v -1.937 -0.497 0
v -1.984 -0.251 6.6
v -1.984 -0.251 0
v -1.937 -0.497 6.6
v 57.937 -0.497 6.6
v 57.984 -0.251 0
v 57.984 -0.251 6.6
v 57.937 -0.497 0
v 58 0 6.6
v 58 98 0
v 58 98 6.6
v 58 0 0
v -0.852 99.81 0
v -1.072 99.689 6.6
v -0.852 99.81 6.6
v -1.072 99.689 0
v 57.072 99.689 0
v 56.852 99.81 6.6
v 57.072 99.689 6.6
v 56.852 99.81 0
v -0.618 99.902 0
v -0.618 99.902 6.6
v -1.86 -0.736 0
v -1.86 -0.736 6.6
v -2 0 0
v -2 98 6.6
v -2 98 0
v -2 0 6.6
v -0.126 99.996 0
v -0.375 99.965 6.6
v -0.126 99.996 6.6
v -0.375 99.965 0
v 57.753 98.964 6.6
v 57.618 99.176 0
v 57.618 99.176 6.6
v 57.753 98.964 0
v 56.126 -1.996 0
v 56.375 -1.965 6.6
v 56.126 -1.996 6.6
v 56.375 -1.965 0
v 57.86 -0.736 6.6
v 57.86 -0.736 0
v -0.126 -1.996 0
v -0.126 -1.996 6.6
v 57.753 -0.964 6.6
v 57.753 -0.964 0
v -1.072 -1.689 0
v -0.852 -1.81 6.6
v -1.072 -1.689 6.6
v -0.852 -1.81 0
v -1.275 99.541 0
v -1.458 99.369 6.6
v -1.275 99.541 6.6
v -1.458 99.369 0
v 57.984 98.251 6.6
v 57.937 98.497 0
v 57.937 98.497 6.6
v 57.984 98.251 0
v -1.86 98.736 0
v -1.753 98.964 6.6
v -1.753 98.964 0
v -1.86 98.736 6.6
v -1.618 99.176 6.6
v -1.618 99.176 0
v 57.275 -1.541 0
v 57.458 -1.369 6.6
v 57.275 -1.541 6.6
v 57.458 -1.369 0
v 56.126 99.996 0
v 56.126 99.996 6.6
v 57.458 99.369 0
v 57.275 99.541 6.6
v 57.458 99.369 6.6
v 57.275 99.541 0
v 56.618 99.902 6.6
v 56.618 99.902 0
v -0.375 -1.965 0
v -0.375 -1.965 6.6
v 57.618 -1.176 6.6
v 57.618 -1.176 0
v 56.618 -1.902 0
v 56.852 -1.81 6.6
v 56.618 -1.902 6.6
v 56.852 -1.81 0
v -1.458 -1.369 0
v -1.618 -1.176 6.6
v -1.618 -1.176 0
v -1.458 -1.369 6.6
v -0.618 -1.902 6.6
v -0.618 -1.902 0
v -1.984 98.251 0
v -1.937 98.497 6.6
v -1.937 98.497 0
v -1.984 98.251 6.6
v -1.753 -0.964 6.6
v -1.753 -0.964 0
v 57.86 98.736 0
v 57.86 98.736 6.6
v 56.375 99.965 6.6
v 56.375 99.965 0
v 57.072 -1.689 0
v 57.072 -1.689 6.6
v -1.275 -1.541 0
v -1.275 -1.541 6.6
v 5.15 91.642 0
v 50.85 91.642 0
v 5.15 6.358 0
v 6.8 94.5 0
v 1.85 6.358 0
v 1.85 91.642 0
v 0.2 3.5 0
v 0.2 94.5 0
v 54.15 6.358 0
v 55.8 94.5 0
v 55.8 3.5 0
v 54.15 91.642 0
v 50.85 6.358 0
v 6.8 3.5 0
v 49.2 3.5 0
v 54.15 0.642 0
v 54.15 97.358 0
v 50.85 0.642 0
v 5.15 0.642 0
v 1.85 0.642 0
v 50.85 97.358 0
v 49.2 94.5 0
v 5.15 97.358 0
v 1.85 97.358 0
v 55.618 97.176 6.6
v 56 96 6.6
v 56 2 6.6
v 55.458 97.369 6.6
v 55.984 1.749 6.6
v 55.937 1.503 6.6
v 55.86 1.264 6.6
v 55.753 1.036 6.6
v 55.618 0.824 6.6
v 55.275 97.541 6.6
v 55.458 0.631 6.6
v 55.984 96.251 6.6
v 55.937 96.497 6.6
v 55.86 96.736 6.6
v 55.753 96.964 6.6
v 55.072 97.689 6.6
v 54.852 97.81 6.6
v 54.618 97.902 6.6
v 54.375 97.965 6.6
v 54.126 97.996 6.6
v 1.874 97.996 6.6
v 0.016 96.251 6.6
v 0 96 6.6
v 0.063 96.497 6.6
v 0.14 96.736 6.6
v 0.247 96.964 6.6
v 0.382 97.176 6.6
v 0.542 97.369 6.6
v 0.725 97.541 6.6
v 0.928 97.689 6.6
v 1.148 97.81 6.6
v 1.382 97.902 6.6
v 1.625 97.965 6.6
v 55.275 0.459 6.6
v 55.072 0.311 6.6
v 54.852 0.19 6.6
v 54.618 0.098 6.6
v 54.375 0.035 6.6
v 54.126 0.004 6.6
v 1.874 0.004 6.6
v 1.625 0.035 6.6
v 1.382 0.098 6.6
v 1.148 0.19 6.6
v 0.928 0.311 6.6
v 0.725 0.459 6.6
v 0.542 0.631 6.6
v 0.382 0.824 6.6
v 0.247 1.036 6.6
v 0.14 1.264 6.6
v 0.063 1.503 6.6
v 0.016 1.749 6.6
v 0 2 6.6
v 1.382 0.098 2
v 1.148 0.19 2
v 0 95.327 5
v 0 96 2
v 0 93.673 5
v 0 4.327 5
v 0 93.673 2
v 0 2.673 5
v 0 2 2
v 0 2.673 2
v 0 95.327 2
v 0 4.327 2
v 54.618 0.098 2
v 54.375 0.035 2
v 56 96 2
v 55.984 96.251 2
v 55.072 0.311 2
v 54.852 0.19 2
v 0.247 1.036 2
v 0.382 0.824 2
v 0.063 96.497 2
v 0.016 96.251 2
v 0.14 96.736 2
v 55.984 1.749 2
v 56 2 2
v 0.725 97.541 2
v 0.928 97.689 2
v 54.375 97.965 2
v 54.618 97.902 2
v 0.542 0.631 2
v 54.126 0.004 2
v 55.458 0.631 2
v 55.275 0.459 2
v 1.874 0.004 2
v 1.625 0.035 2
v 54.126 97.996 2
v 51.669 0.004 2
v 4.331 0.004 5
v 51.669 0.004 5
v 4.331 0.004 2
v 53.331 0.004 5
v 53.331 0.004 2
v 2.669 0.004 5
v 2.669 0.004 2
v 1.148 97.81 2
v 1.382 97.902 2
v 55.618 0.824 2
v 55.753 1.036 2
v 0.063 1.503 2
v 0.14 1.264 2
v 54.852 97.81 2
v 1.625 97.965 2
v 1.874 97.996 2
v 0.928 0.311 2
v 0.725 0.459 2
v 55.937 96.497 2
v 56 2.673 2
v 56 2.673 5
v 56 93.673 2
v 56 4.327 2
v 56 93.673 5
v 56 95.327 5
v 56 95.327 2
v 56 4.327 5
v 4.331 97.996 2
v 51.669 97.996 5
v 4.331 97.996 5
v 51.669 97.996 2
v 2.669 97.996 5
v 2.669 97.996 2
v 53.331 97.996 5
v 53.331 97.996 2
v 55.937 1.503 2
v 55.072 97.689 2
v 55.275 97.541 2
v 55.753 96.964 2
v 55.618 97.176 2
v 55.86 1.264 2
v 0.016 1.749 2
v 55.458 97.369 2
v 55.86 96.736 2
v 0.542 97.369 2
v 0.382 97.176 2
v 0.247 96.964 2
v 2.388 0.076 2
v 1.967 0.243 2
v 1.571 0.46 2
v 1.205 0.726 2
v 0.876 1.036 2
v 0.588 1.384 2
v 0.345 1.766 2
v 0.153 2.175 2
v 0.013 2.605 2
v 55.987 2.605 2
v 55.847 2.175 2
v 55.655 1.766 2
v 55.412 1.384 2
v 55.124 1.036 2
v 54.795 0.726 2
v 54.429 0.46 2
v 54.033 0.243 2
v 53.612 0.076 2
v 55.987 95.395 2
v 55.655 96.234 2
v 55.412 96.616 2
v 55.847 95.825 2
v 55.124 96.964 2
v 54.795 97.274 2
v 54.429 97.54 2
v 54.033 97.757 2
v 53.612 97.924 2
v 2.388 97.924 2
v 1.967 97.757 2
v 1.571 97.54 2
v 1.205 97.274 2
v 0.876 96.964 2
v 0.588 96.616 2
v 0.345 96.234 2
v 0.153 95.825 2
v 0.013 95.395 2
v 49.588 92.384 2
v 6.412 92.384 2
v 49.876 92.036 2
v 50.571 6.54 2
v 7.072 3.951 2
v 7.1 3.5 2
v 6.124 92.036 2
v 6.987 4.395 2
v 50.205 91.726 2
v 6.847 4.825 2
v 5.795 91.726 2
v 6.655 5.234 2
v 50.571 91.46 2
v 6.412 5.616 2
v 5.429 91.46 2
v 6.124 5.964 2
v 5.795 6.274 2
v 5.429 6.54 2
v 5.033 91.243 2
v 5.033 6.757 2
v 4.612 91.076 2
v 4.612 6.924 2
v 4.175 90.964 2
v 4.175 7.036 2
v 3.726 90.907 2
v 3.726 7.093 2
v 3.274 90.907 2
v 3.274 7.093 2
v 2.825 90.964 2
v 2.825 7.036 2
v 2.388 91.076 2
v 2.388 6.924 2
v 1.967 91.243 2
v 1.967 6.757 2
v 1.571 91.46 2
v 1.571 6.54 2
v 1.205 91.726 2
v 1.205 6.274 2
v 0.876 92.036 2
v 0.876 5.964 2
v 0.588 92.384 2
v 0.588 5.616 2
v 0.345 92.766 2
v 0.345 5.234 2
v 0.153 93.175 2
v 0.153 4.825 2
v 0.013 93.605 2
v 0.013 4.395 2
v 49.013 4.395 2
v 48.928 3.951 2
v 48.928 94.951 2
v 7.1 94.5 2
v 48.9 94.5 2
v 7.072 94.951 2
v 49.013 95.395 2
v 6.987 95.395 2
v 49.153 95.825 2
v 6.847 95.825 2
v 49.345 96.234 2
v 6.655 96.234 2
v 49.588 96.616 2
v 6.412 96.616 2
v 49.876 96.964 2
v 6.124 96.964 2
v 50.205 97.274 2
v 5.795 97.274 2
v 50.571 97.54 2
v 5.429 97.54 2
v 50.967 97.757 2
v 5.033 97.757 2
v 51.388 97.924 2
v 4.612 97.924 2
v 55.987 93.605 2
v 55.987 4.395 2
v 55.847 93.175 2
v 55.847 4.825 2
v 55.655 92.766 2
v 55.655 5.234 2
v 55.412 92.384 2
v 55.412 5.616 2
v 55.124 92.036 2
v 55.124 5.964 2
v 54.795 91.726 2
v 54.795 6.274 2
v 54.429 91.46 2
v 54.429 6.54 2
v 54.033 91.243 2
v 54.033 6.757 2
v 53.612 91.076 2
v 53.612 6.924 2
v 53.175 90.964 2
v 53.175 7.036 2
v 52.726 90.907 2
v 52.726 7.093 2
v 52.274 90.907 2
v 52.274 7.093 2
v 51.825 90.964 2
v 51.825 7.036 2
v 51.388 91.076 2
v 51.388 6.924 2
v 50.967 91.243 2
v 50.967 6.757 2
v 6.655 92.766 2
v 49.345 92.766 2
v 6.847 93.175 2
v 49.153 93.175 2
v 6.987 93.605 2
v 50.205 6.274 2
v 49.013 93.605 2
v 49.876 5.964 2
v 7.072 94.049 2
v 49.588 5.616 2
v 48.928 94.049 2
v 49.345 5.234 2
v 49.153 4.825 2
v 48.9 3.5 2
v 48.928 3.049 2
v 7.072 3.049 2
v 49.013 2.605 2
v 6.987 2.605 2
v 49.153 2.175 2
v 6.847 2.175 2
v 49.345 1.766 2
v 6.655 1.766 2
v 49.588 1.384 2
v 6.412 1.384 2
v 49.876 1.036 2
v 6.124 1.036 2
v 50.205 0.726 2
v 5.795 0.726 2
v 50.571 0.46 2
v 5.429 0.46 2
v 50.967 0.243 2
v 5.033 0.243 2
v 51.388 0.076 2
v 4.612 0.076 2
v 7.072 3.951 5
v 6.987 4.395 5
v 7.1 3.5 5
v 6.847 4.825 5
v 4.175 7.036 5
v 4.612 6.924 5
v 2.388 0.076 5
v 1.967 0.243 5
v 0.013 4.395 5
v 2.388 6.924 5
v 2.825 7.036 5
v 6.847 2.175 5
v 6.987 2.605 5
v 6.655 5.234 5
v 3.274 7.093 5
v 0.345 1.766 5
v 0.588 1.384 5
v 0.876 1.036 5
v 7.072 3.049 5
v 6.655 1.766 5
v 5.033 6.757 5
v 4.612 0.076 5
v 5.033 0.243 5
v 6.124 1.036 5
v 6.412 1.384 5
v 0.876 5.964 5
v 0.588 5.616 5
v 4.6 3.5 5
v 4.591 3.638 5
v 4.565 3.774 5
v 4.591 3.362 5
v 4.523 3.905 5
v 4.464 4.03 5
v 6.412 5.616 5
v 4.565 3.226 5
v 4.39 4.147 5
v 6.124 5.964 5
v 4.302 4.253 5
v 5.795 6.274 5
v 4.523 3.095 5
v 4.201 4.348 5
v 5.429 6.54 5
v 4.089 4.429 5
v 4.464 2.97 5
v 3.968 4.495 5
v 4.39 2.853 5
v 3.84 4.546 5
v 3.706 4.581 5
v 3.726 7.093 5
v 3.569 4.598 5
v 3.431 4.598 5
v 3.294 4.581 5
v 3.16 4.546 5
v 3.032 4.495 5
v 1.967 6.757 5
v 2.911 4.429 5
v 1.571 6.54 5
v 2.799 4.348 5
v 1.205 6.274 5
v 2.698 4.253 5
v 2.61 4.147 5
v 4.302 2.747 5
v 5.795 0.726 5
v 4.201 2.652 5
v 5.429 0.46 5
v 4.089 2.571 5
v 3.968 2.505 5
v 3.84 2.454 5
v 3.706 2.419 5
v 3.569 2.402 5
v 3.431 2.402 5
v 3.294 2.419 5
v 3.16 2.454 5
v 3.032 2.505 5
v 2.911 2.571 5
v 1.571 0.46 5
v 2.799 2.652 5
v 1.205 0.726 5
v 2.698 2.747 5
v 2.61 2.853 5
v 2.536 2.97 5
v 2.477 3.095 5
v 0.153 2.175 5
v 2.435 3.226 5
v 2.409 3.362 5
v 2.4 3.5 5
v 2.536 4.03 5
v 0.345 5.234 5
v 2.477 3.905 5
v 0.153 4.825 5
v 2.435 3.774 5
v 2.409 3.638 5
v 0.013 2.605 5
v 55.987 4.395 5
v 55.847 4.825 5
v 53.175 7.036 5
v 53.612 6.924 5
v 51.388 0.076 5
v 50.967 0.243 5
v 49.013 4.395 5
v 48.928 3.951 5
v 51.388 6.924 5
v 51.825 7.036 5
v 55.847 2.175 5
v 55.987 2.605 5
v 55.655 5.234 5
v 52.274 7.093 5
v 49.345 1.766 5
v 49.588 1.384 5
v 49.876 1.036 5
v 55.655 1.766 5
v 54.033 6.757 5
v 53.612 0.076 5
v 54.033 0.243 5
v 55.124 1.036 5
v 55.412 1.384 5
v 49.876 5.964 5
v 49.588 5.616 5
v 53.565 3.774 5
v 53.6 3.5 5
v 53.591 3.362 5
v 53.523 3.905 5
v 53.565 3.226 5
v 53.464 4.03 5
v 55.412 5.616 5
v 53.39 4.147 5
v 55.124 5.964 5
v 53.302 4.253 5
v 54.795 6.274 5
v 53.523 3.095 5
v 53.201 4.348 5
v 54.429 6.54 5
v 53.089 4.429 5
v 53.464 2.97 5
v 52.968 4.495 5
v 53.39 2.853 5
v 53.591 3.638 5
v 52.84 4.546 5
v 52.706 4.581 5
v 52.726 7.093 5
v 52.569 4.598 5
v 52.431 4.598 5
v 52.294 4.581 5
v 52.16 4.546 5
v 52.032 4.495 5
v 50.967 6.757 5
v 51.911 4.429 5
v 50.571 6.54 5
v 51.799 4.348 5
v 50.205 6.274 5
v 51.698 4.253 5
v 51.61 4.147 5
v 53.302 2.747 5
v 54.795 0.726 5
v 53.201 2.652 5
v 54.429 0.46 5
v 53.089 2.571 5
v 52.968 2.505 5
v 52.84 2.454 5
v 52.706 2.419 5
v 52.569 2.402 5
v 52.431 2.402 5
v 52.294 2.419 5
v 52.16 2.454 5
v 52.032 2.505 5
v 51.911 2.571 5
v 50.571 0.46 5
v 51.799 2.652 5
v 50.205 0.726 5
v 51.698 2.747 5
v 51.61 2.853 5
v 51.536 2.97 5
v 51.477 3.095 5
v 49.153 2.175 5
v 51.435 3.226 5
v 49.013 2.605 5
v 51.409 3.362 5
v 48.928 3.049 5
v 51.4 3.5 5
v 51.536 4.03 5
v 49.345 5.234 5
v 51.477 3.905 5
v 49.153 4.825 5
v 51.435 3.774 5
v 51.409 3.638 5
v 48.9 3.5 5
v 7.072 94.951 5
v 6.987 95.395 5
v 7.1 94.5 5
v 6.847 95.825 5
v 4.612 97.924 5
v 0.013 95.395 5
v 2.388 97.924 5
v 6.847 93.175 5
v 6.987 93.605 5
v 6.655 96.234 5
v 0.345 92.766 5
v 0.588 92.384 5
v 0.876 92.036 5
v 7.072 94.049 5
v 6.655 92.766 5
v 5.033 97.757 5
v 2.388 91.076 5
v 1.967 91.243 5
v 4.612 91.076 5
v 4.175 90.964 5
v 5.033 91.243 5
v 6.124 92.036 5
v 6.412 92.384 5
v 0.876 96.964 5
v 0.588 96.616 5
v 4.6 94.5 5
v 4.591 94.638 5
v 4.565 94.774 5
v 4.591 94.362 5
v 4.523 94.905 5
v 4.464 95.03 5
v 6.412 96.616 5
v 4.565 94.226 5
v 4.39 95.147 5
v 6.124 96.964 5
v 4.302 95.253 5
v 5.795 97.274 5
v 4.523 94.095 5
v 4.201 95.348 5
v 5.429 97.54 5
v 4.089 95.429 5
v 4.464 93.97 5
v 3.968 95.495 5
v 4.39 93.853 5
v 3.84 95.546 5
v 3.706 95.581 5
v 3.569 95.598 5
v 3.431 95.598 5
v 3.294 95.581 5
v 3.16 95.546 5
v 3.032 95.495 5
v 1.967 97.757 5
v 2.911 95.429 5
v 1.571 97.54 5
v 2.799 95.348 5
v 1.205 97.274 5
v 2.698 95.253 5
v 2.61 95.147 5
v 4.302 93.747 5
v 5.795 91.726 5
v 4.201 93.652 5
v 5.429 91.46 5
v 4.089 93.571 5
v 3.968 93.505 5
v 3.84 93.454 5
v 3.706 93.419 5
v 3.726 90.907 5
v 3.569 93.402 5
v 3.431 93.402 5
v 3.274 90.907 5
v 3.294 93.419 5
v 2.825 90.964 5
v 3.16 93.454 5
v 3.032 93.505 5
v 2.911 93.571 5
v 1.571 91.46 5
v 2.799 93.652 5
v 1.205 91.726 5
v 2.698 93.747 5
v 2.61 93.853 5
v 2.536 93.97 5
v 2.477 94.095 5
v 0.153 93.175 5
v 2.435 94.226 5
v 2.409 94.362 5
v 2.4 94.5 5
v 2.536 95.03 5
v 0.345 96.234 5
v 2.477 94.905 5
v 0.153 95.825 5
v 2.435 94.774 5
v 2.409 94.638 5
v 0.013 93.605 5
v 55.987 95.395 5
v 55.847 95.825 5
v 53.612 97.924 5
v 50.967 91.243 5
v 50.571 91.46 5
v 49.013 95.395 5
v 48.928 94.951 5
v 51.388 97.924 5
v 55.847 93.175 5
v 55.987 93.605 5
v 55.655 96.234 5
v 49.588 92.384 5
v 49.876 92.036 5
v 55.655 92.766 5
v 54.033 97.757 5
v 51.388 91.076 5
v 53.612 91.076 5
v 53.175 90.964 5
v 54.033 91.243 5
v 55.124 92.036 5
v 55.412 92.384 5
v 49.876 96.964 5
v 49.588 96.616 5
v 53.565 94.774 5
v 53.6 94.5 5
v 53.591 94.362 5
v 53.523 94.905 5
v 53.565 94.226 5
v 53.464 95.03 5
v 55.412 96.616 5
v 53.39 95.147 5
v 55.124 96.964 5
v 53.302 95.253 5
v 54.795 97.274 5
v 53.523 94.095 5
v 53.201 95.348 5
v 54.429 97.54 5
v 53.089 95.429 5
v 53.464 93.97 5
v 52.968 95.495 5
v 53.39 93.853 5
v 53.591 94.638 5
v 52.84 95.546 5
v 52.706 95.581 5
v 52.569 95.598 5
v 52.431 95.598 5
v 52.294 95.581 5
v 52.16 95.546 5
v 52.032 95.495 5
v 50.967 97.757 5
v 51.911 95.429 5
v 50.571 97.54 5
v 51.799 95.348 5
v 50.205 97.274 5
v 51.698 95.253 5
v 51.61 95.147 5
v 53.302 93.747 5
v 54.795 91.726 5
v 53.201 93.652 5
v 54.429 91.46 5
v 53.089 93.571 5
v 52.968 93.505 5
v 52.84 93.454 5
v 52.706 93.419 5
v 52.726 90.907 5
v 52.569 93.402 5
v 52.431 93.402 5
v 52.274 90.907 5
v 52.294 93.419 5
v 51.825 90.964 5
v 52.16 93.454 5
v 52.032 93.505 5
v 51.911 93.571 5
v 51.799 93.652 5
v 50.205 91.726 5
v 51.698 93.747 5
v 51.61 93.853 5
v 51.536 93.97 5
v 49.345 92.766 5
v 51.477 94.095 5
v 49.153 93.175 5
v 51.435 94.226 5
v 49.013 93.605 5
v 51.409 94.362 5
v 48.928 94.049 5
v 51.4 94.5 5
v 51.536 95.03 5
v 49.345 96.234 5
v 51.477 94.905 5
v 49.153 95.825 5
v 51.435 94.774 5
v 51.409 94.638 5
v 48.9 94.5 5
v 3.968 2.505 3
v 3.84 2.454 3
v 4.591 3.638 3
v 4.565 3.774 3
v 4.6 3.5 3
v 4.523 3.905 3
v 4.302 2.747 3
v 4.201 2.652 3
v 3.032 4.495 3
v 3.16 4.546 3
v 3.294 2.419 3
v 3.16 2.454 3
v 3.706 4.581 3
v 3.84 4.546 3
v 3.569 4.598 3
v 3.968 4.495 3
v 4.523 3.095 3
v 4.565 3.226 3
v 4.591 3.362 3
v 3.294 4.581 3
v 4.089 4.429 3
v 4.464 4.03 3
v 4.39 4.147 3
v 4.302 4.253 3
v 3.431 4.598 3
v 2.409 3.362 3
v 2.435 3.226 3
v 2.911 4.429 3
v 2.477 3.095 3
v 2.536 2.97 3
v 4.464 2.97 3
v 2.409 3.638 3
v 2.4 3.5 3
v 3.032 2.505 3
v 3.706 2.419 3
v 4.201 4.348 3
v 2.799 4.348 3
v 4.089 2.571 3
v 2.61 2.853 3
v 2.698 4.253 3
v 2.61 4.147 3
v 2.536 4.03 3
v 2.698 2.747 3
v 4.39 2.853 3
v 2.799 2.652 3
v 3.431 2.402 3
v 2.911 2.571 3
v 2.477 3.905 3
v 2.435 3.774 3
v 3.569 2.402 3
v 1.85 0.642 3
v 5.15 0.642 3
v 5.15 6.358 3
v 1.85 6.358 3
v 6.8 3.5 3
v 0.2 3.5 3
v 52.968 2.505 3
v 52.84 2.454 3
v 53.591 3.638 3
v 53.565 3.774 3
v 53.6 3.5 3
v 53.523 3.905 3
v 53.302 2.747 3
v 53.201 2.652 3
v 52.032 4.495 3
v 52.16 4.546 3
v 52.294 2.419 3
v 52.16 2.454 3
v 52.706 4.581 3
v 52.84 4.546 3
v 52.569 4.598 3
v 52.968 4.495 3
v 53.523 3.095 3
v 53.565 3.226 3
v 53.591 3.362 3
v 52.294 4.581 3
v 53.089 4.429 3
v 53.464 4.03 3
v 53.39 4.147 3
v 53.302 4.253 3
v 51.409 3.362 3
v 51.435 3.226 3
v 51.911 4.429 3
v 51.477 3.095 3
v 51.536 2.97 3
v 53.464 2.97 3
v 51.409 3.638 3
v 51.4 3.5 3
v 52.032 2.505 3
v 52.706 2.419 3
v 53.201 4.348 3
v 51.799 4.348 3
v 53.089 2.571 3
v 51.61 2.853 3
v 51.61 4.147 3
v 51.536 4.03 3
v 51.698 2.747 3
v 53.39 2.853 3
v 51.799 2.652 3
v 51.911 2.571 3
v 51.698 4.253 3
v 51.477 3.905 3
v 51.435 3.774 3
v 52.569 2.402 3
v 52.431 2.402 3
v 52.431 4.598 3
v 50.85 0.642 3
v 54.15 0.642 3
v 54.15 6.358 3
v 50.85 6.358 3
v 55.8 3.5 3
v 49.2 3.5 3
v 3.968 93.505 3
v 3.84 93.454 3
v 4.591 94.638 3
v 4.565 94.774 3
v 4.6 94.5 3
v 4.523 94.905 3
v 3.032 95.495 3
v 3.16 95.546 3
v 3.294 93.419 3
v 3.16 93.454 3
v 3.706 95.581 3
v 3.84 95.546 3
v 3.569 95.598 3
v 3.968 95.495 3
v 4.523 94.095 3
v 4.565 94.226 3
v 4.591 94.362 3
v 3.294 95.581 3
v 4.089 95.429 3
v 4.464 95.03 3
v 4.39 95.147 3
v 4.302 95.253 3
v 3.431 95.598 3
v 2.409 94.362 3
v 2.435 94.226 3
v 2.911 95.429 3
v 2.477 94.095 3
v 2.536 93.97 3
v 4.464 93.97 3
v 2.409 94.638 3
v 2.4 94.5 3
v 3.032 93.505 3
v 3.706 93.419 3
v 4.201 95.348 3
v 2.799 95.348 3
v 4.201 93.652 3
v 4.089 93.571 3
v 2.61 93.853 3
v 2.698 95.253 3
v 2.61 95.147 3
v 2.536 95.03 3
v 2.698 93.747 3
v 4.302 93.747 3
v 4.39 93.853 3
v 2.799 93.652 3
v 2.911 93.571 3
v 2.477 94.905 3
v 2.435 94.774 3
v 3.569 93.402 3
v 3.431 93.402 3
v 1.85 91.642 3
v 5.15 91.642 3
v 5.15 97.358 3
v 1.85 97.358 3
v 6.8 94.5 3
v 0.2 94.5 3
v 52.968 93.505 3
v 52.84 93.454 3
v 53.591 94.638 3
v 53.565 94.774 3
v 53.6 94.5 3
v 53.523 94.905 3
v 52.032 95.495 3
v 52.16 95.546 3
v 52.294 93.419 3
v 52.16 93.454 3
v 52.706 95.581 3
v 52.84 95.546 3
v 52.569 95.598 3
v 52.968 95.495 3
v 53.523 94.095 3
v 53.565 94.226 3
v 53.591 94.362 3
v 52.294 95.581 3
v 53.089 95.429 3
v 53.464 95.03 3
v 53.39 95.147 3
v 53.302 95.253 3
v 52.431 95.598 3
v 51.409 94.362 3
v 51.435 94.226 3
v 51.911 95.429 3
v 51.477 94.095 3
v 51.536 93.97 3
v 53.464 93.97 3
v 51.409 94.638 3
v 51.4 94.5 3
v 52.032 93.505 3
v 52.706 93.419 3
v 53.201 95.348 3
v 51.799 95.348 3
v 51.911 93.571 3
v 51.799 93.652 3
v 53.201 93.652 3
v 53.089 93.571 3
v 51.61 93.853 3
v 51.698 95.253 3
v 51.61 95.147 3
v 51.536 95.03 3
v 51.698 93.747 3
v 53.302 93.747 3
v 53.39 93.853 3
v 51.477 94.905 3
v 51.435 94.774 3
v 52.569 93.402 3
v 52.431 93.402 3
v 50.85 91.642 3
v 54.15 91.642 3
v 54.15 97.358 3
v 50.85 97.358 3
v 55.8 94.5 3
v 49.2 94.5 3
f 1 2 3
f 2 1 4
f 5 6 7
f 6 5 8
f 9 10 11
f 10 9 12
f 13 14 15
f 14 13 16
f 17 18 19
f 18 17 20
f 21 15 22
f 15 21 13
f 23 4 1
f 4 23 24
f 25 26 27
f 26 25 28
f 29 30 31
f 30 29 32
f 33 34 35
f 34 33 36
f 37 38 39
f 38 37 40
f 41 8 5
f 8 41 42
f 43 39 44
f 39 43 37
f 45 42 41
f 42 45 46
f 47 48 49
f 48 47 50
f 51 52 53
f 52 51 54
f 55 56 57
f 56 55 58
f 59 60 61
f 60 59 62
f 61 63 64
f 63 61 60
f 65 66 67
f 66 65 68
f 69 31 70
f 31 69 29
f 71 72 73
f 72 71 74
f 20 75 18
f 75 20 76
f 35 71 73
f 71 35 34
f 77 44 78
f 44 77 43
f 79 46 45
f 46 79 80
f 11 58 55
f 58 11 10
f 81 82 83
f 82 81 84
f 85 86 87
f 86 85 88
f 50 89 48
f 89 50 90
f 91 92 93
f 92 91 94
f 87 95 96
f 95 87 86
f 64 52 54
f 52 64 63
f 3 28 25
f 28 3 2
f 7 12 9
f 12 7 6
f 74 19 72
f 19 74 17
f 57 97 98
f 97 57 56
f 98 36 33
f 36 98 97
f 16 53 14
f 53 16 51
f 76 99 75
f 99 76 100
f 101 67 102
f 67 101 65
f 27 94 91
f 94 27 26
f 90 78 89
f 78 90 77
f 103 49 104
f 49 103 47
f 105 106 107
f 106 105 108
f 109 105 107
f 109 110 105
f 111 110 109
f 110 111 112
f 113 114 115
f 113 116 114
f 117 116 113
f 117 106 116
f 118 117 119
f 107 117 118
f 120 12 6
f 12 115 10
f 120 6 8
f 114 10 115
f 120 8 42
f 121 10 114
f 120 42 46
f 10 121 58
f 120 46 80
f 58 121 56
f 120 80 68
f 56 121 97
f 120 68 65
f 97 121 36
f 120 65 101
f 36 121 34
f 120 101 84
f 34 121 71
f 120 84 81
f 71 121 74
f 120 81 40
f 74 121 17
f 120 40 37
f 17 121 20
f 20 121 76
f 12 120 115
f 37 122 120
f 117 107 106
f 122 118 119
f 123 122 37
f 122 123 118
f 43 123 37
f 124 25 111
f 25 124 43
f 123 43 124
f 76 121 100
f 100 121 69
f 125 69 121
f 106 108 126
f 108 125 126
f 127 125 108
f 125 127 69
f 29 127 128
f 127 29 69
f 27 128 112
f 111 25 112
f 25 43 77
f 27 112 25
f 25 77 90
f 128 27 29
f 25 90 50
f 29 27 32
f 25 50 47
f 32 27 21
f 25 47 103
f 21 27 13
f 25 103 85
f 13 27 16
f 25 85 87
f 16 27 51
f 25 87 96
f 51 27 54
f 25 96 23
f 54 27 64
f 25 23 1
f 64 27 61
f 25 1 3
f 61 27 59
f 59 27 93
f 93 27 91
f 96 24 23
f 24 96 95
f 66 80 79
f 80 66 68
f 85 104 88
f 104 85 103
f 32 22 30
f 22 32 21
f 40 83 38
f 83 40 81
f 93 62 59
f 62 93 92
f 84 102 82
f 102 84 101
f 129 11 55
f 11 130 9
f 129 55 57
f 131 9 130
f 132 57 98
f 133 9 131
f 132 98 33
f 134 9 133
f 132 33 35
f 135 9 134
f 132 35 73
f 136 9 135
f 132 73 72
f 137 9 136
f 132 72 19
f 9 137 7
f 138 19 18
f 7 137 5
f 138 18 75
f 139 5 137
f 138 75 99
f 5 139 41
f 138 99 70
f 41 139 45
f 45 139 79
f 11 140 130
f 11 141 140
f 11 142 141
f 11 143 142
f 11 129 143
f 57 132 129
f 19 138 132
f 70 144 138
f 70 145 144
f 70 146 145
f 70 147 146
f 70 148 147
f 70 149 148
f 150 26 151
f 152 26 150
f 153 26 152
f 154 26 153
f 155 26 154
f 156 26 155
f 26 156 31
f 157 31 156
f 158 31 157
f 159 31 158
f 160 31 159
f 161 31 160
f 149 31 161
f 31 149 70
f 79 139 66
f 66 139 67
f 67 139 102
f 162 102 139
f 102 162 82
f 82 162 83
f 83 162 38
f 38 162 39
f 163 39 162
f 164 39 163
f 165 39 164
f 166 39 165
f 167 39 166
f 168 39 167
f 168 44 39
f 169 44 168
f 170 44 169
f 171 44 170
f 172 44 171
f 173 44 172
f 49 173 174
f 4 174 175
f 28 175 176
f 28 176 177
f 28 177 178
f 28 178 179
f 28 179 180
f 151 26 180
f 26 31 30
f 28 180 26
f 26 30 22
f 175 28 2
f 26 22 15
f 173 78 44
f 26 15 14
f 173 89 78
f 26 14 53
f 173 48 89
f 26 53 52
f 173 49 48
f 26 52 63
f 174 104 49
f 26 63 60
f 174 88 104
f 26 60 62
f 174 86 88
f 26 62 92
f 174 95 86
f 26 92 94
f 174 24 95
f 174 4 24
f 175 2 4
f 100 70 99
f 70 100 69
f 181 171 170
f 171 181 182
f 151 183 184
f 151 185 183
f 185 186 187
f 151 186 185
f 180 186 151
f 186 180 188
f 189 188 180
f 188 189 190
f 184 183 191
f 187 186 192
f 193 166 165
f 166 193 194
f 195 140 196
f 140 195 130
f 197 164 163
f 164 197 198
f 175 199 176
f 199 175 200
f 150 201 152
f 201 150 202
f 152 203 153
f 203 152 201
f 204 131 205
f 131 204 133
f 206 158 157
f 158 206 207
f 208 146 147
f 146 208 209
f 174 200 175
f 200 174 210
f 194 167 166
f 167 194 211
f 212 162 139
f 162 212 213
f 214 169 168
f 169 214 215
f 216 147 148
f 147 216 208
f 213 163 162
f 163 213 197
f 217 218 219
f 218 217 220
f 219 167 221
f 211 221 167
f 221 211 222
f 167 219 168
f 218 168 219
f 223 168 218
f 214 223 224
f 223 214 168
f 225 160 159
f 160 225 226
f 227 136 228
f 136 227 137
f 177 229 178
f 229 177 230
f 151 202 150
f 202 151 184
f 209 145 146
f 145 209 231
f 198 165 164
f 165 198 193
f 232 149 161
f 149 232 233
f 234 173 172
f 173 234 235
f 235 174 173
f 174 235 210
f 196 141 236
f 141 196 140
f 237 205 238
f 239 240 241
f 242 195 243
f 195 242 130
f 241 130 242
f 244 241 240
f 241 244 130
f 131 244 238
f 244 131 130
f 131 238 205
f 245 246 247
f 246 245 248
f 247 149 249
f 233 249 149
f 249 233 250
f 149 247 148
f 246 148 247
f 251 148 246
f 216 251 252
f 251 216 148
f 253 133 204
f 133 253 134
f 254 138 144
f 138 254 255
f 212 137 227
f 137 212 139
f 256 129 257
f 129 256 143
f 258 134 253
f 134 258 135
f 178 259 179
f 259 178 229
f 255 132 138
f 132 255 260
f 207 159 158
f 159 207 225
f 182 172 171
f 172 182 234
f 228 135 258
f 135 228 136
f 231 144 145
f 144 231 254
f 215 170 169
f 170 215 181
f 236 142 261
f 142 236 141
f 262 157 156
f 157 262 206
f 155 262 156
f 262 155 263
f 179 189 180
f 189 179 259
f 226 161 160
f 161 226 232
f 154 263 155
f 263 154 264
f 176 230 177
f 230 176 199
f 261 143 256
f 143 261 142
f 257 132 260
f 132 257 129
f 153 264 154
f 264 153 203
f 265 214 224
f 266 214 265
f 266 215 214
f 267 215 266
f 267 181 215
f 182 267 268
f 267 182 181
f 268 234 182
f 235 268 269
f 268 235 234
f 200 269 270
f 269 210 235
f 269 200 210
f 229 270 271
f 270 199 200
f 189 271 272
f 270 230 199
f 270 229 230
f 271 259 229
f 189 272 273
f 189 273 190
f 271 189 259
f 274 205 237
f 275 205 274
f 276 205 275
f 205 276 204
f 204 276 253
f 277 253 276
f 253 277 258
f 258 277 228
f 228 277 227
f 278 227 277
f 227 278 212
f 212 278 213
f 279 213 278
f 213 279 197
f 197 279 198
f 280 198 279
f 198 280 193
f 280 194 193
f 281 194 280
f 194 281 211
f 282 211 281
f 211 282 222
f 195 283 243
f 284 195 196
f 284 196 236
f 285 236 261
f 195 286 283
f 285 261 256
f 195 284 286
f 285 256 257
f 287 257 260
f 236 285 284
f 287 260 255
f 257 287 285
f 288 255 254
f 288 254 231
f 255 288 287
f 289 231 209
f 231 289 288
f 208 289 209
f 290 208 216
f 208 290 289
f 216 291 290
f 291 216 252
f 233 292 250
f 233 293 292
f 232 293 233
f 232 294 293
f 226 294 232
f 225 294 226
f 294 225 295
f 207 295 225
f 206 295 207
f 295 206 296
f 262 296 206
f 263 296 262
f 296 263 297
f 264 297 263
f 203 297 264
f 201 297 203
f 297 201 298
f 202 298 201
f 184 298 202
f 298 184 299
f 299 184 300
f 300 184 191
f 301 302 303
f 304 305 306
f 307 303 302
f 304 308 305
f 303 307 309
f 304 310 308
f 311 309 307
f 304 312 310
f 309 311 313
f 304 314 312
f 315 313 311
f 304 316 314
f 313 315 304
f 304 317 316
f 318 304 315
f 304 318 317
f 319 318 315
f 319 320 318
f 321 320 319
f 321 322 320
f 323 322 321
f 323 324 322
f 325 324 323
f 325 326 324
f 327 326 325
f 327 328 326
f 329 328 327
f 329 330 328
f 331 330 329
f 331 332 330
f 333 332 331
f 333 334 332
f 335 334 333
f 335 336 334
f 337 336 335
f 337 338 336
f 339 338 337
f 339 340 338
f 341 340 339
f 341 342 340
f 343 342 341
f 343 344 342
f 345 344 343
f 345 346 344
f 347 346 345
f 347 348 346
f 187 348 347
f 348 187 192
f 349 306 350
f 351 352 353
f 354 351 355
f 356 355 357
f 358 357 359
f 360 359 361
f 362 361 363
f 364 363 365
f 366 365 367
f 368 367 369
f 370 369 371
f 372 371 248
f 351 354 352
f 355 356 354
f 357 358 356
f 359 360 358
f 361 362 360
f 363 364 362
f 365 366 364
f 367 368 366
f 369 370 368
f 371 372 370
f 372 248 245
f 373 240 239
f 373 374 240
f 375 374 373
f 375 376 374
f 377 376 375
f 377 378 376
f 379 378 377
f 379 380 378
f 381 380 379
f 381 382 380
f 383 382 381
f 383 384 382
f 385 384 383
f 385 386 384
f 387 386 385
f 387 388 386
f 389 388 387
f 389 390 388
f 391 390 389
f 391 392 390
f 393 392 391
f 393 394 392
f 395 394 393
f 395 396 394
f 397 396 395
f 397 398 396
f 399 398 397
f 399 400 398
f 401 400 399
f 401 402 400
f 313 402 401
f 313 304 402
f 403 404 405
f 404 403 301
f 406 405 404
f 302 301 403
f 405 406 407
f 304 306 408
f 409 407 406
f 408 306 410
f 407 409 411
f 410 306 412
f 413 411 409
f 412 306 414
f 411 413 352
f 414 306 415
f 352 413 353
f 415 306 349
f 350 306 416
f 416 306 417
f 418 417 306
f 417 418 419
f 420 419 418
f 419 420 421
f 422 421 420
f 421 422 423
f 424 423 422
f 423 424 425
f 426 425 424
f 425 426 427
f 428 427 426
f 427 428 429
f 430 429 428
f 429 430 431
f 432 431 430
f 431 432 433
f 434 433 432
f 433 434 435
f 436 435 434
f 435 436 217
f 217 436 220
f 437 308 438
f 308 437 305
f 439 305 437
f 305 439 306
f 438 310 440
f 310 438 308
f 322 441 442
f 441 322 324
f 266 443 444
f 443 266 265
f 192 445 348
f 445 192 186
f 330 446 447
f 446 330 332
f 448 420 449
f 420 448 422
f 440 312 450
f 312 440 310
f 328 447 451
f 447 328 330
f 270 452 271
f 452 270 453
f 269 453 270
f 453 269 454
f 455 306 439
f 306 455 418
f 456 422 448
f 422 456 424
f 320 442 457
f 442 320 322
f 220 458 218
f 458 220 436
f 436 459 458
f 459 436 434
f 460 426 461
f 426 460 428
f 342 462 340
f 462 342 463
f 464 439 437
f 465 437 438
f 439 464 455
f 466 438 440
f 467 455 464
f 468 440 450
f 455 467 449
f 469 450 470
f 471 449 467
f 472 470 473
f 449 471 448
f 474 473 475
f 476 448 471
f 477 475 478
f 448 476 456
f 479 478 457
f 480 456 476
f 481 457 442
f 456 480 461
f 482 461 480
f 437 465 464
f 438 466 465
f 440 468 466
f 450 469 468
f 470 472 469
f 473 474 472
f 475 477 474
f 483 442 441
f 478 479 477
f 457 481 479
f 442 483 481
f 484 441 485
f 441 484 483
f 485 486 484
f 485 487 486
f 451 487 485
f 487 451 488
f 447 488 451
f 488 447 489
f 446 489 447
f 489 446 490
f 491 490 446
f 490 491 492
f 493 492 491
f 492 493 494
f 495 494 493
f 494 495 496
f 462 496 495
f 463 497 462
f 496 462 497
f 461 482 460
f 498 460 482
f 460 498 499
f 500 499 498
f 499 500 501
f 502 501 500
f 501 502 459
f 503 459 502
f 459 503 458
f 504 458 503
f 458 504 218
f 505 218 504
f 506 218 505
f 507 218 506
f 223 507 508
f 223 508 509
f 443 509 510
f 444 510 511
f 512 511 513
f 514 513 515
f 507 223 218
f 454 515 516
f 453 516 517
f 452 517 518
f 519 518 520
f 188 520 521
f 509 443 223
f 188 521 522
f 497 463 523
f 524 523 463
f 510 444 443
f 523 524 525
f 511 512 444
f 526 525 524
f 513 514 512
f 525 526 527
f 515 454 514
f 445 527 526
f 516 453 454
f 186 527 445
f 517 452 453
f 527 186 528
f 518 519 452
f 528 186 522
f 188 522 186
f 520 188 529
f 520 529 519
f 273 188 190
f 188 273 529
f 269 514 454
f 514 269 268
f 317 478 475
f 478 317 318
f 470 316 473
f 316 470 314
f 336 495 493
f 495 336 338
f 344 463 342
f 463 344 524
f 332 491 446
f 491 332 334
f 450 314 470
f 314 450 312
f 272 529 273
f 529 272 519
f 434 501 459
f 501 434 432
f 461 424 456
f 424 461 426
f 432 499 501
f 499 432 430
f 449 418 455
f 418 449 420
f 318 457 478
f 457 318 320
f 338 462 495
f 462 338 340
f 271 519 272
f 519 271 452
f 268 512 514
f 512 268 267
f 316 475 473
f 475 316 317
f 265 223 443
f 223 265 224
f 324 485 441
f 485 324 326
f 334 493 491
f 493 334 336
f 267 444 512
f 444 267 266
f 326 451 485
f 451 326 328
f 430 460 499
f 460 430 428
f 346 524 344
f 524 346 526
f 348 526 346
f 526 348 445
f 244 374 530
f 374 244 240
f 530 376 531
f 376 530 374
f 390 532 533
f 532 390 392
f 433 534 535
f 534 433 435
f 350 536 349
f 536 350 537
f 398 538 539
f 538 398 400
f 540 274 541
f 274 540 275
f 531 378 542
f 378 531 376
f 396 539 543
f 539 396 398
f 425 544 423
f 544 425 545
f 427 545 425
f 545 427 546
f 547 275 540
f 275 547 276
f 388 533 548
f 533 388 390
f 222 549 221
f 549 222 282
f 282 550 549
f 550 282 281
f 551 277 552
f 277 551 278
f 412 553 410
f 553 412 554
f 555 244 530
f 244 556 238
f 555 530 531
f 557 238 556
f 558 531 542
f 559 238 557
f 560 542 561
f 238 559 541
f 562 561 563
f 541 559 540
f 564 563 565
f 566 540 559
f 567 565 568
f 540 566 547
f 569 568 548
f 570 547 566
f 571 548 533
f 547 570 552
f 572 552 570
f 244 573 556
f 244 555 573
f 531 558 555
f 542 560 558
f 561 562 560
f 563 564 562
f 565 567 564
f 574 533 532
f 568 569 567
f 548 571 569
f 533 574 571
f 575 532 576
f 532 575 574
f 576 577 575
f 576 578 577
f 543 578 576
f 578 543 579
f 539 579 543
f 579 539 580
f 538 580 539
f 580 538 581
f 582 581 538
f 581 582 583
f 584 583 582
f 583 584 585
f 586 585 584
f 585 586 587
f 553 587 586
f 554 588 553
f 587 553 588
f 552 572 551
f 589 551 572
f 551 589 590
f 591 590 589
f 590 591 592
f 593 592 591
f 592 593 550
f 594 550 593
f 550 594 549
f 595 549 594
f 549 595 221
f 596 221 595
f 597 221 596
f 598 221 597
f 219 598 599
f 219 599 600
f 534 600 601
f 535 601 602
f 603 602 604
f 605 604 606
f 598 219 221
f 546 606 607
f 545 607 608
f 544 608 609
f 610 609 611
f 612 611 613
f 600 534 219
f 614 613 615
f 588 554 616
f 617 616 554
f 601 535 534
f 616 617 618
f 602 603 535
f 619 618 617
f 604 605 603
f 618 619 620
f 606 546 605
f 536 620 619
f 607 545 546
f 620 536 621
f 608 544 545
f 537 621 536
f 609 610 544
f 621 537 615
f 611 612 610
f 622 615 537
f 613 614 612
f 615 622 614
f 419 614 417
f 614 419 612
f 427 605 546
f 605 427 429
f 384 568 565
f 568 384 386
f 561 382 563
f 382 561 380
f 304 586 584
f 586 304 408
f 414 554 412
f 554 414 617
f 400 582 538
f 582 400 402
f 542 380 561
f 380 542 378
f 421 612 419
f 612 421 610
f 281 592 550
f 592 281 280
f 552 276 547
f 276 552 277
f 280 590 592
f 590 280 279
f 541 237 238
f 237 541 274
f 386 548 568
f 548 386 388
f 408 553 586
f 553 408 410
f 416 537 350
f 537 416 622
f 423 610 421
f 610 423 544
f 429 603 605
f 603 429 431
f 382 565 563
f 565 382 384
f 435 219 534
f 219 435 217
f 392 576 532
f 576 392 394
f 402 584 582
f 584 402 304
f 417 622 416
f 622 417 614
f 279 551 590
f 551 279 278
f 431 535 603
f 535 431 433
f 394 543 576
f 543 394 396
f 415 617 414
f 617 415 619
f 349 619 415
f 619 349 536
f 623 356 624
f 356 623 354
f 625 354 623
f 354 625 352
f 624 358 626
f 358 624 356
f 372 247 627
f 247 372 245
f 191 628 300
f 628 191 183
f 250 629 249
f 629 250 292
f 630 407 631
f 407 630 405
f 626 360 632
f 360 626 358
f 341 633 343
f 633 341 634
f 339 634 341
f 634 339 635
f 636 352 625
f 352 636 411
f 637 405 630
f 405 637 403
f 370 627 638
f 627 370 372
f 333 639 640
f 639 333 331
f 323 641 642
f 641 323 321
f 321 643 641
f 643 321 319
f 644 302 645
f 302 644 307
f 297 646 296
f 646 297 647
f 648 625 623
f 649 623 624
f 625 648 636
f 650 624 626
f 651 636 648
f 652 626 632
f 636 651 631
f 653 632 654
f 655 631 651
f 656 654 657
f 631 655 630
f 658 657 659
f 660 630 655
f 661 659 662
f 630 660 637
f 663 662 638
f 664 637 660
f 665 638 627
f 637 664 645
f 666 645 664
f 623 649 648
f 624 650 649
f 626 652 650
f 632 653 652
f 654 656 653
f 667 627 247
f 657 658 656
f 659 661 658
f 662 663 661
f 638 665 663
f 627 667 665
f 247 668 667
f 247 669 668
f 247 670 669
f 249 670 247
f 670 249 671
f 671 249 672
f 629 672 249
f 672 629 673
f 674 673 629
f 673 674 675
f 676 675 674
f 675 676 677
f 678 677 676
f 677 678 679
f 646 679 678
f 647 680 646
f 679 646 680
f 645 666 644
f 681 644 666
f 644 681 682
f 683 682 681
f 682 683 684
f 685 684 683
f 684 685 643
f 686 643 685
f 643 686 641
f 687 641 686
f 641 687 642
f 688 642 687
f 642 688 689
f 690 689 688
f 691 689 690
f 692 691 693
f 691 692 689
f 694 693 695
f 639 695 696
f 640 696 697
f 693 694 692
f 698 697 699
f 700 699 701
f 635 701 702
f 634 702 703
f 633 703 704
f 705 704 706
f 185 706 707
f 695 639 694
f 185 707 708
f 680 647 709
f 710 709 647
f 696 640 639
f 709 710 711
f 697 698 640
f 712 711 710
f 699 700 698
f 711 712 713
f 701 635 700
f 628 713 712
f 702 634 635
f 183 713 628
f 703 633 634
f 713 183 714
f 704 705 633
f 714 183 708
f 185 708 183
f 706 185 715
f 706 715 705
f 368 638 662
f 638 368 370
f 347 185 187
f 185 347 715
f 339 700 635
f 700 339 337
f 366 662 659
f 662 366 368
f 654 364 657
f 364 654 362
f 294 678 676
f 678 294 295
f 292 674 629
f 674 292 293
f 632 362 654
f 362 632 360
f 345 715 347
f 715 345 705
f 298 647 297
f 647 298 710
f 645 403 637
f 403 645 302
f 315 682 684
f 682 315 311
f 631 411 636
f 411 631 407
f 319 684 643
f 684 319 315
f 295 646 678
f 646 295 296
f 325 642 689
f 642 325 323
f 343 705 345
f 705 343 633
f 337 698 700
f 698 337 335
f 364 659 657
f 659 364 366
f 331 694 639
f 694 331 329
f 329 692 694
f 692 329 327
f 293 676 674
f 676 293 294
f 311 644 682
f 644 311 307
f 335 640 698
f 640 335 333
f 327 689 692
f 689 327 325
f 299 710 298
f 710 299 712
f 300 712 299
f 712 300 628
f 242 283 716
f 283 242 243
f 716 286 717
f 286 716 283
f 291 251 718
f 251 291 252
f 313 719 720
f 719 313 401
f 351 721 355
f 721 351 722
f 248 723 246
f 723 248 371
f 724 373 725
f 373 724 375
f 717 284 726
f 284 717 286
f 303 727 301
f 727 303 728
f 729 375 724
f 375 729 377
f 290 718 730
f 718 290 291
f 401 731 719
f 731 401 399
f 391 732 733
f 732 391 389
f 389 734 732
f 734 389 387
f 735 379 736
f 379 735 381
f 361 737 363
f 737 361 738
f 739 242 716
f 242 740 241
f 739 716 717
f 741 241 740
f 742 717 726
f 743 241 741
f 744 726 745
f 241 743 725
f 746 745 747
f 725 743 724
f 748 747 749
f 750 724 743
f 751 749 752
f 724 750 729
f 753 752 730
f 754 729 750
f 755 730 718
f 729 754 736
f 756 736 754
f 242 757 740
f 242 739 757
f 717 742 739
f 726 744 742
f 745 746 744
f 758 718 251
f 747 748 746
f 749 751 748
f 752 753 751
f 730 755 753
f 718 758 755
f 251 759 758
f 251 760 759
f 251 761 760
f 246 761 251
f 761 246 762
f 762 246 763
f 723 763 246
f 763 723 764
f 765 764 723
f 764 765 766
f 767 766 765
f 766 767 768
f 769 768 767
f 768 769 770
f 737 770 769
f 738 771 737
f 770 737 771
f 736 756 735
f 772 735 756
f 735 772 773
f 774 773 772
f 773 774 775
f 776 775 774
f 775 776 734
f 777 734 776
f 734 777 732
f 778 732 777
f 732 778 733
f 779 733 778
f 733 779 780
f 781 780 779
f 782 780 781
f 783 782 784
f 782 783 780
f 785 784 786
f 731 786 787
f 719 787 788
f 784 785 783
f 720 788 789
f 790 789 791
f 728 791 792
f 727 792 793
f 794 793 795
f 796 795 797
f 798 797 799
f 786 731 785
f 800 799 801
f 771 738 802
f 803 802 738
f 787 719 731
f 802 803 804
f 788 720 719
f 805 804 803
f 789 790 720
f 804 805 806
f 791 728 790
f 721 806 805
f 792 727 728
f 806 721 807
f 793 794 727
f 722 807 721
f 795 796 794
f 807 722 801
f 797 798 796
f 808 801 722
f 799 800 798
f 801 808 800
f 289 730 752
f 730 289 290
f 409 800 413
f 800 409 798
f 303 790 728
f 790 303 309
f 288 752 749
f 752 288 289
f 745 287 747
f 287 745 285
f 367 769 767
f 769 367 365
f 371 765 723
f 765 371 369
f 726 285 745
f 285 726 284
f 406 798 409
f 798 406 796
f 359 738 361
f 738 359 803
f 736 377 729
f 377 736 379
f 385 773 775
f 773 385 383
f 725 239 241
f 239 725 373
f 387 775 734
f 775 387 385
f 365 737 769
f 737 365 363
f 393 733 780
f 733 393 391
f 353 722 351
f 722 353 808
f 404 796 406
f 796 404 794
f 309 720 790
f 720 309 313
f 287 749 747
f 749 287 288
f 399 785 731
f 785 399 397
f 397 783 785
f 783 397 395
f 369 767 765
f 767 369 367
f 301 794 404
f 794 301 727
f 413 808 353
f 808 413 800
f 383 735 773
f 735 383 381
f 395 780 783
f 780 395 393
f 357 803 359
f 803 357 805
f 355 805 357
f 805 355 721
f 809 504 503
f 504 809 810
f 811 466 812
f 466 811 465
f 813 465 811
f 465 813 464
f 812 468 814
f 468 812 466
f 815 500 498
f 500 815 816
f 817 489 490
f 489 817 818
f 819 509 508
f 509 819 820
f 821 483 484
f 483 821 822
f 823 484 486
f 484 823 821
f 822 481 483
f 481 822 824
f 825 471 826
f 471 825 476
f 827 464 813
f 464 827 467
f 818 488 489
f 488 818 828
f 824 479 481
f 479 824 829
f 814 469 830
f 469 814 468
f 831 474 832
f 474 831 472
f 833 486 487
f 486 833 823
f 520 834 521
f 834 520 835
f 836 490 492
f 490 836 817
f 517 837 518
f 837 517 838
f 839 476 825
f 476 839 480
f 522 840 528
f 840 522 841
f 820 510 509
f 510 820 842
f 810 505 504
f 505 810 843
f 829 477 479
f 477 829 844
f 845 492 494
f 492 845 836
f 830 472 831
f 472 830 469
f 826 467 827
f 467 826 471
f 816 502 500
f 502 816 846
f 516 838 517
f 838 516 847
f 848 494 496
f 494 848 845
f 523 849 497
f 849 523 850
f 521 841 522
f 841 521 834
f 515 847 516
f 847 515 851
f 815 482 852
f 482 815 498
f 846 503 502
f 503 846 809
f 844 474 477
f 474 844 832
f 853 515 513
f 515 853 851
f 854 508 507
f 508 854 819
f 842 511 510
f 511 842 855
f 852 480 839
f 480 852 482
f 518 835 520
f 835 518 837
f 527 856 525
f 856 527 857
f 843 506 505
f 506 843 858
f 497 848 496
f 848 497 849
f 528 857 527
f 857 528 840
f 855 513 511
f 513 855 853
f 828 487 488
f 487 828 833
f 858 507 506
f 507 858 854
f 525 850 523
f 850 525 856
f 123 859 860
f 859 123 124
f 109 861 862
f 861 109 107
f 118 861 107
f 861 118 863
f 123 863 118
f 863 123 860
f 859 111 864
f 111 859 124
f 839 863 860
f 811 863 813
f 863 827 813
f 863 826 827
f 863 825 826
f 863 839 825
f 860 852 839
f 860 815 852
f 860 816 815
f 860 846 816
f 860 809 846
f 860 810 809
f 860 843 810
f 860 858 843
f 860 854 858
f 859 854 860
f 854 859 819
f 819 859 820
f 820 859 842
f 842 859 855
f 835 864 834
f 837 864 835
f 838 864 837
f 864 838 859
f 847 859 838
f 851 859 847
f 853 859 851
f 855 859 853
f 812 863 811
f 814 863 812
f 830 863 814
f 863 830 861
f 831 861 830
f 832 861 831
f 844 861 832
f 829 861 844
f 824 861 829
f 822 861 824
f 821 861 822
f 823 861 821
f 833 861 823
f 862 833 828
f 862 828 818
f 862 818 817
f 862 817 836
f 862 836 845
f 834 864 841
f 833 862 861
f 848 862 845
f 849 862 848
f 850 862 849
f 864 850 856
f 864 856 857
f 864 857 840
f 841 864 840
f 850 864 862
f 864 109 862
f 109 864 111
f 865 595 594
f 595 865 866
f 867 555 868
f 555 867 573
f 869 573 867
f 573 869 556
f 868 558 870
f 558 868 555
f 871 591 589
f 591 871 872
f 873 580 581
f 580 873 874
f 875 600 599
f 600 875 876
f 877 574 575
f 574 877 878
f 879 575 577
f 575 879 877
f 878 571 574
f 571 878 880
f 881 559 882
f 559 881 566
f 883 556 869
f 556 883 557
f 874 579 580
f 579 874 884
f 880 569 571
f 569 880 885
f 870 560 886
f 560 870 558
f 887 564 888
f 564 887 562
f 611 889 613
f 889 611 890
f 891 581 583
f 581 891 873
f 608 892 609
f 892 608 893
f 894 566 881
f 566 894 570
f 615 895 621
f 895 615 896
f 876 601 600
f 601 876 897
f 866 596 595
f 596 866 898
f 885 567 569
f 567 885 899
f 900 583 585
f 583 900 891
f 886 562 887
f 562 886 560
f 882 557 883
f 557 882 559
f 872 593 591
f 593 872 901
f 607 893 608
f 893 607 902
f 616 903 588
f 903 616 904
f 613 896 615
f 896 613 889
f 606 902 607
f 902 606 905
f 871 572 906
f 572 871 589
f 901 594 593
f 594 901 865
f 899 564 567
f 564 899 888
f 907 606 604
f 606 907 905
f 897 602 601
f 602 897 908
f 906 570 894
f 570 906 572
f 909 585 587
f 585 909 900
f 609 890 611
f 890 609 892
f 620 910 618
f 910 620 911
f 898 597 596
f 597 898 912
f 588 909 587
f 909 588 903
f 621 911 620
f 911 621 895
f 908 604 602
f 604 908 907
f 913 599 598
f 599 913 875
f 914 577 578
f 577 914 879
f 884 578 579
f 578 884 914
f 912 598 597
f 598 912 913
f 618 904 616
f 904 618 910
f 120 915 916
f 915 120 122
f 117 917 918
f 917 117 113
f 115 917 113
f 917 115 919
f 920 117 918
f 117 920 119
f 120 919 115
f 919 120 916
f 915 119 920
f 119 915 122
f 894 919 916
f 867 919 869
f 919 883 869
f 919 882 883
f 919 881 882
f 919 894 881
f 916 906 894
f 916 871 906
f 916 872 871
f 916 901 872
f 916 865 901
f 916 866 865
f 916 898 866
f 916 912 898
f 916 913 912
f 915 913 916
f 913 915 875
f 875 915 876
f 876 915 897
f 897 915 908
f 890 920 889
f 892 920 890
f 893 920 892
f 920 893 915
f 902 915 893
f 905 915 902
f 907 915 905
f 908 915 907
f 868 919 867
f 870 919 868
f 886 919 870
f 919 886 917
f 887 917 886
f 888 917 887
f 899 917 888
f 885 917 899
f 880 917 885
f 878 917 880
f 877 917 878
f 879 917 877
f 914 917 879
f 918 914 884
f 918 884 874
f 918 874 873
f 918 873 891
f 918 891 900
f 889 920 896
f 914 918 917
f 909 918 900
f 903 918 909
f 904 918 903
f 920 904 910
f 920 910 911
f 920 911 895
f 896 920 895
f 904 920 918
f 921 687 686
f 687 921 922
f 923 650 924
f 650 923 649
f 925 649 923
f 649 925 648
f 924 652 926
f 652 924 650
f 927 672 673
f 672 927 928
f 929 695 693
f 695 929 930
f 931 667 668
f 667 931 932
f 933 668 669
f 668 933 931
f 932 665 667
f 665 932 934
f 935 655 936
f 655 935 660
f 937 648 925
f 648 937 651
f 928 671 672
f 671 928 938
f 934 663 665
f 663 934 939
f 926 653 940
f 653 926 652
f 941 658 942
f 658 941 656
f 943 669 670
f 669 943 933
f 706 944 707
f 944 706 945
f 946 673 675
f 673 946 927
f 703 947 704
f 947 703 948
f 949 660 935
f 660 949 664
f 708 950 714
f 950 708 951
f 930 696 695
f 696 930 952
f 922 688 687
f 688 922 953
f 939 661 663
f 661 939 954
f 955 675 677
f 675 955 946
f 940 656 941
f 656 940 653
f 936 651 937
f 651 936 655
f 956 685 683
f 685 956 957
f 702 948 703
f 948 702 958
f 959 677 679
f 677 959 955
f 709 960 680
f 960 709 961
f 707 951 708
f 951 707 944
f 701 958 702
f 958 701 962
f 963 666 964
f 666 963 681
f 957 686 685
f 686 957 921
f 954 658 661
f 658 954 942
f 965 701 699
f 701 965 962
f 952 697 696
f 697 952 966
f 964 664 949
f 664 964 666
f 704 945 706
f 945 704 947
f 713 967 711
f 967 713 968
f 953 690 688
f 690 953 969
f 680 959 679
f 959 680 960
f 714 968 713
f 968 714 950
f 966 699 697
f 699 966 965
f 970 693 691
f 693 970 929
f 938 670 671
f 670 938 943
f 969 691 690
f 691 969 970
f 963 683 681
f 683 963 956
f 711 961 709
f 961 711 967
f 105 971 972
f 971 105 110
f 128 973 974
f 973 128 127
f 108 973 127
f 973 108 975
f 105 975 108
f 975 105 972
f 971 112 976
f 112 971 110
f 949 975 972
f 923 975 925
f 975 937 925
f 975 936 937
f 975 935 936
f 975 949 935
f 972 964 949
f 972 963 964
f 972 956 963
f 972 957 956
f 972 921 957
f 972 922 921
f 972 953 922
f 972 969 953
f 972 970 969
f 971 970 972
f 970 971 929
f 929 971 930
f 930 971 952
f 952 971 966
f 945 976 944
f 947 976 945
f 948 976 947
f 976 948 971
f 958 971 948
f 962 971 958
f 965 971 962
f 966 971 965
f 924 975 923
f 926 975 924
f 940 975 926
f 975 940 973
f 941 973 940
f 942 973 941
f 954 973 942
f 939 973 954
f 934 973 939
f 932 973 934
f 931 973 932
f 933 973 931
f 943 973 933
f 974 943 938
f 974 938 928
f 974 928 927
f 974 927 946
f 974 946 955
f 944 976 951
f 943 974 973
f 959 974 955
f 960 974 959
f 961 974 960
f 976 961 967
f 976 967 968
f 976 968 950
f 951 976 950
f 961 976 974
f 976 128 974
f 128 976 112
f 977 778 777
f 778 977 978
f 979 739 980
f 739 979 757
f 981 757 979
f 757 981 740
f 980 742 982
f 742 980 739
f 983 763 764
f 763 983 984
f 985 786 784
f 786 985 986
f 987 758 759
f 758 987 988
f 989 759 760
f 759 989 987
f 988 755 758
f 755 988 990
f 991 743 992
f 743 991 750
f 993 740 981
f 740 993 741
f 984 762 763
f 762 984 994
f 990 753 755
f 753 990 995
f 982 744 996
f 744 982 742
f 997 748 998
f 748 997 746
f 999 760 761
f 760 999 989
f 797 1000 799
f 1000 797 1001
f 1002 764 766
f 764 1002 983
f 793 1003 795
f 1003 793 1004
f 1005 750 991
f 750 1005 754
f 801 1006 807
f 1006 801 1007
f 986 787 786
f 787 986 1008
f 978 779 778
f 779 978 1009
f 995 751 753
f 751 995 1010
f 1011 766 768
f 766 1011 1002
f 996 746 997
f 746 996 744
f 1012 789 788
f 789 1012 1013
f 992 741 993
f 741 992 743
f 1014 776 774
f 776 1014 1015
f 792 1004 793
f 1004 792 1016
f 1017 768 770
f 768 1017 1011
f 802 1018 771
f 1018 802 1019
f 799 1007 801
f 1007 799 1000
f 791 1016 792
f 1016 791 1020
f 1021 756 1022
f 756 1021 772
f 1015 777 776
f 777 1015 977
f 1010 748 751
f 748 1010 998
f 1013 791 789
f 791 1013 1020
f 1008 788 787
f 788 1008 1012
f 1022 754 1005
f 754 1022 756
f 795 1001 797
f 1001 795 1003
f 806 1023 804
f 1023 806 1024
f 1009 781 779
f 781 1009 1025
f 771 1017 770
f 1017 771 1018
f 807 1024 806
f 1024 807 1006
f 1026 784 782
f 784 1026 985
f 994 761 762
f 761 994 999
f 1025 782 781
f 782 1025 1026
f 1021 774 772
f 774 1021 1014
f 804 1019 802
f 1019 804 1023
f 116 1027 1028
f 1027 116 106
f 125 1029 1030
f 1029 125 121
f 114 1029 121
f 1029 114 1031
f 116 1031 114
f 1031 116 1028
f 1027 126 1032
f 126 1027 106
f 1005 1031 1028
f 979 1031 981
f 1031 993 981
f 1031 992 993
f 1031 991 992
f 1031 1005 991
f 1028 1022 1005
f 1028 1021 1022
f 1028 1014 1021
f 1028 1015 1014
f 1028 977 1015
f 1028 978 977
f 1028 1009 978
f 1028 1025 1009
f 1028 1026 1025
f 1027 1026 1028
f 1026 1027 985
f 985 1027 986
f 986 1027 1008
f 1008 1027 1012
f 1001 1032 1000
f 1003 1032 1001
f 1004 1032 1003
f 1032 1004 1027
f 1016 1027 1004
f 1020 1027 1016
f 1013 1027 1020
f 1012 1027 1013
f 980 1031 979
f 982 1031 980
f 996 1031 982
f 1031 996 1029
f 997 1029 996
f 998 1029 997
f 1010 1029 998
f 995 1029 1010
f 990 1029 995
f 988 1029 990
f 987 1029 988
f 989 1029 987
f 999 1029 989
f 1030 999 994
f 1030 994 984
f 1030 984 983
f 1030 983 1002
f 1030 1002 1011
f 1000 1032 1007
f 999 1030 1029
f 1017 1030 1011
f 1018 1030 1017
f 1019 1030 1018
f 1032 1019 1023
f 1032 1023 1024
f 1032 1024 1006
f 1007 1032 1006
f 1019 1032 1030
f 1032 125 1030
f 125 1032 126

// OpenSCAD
// file: common.scad
pcb_width = 98;
pcb_height = 56;
pcb_thickness = 1.6;
pcb_screw_hole_radius = 2.1;	// M4/2-margin

thickness = 2;
round_radius = 2;

width = pcb_width + thickness * 2;	// y
height = pcb_height + thickness * 2;	// x
bottom_depth = 5;	// z
top_depth = 26;		// z

screw_hole_radius = 1.1;	// M2/2
screw_posx = 3.5;
screw_posy = 3.5;

rj45 = [16, thickness*2, 13.8];
usb = [15, thickness*2, 9];

$fn = 50;

posx = screw_posx;
posy = screw_posy;
holes = [
    [posx, posy, 0],
    [pcb_height-posx, posy, 0],
    [posx, pcb_width-posy, 0],
    [pcb_height-posx, pcb_width-posy, 0]
];
// main file
include <common.scad>;

module case () {
    difference () {
        minkowski() {
            cube([height-round_radius*2, width-round_radius*2, bottom_depth]);
            cylinder(r=round_radius, h=pcb_thickness);
        }

        translate([round_radius,round_radius,thickness]) minkowski() {
            cube([pcb_height-round_radius*2, pcb_width-round_radius*2, bottom_depth]);
            cylinder(r=round_radius, h=1);
        }
    }

    // Screw supports
    for (hole = holes) {
        translate(hole)
            cylinder(r=screw_hole_radius+2.5, h=bottom_depth);
    }
}

module screw_holes() {
    for (hole = holes) {
        translate([hole[0], hole[1], -thickness])
            cylinder(r=screw_hole_radius, h=bottom_depth+thickness);

        translate([hole[0], hole[1], -bottom_depth+thickness])
            cylinder(r=3.3, h=bottom_depth-thickness+3, $fn=6);
    }
}

difference () {
    case();
    screw_holes();
}
